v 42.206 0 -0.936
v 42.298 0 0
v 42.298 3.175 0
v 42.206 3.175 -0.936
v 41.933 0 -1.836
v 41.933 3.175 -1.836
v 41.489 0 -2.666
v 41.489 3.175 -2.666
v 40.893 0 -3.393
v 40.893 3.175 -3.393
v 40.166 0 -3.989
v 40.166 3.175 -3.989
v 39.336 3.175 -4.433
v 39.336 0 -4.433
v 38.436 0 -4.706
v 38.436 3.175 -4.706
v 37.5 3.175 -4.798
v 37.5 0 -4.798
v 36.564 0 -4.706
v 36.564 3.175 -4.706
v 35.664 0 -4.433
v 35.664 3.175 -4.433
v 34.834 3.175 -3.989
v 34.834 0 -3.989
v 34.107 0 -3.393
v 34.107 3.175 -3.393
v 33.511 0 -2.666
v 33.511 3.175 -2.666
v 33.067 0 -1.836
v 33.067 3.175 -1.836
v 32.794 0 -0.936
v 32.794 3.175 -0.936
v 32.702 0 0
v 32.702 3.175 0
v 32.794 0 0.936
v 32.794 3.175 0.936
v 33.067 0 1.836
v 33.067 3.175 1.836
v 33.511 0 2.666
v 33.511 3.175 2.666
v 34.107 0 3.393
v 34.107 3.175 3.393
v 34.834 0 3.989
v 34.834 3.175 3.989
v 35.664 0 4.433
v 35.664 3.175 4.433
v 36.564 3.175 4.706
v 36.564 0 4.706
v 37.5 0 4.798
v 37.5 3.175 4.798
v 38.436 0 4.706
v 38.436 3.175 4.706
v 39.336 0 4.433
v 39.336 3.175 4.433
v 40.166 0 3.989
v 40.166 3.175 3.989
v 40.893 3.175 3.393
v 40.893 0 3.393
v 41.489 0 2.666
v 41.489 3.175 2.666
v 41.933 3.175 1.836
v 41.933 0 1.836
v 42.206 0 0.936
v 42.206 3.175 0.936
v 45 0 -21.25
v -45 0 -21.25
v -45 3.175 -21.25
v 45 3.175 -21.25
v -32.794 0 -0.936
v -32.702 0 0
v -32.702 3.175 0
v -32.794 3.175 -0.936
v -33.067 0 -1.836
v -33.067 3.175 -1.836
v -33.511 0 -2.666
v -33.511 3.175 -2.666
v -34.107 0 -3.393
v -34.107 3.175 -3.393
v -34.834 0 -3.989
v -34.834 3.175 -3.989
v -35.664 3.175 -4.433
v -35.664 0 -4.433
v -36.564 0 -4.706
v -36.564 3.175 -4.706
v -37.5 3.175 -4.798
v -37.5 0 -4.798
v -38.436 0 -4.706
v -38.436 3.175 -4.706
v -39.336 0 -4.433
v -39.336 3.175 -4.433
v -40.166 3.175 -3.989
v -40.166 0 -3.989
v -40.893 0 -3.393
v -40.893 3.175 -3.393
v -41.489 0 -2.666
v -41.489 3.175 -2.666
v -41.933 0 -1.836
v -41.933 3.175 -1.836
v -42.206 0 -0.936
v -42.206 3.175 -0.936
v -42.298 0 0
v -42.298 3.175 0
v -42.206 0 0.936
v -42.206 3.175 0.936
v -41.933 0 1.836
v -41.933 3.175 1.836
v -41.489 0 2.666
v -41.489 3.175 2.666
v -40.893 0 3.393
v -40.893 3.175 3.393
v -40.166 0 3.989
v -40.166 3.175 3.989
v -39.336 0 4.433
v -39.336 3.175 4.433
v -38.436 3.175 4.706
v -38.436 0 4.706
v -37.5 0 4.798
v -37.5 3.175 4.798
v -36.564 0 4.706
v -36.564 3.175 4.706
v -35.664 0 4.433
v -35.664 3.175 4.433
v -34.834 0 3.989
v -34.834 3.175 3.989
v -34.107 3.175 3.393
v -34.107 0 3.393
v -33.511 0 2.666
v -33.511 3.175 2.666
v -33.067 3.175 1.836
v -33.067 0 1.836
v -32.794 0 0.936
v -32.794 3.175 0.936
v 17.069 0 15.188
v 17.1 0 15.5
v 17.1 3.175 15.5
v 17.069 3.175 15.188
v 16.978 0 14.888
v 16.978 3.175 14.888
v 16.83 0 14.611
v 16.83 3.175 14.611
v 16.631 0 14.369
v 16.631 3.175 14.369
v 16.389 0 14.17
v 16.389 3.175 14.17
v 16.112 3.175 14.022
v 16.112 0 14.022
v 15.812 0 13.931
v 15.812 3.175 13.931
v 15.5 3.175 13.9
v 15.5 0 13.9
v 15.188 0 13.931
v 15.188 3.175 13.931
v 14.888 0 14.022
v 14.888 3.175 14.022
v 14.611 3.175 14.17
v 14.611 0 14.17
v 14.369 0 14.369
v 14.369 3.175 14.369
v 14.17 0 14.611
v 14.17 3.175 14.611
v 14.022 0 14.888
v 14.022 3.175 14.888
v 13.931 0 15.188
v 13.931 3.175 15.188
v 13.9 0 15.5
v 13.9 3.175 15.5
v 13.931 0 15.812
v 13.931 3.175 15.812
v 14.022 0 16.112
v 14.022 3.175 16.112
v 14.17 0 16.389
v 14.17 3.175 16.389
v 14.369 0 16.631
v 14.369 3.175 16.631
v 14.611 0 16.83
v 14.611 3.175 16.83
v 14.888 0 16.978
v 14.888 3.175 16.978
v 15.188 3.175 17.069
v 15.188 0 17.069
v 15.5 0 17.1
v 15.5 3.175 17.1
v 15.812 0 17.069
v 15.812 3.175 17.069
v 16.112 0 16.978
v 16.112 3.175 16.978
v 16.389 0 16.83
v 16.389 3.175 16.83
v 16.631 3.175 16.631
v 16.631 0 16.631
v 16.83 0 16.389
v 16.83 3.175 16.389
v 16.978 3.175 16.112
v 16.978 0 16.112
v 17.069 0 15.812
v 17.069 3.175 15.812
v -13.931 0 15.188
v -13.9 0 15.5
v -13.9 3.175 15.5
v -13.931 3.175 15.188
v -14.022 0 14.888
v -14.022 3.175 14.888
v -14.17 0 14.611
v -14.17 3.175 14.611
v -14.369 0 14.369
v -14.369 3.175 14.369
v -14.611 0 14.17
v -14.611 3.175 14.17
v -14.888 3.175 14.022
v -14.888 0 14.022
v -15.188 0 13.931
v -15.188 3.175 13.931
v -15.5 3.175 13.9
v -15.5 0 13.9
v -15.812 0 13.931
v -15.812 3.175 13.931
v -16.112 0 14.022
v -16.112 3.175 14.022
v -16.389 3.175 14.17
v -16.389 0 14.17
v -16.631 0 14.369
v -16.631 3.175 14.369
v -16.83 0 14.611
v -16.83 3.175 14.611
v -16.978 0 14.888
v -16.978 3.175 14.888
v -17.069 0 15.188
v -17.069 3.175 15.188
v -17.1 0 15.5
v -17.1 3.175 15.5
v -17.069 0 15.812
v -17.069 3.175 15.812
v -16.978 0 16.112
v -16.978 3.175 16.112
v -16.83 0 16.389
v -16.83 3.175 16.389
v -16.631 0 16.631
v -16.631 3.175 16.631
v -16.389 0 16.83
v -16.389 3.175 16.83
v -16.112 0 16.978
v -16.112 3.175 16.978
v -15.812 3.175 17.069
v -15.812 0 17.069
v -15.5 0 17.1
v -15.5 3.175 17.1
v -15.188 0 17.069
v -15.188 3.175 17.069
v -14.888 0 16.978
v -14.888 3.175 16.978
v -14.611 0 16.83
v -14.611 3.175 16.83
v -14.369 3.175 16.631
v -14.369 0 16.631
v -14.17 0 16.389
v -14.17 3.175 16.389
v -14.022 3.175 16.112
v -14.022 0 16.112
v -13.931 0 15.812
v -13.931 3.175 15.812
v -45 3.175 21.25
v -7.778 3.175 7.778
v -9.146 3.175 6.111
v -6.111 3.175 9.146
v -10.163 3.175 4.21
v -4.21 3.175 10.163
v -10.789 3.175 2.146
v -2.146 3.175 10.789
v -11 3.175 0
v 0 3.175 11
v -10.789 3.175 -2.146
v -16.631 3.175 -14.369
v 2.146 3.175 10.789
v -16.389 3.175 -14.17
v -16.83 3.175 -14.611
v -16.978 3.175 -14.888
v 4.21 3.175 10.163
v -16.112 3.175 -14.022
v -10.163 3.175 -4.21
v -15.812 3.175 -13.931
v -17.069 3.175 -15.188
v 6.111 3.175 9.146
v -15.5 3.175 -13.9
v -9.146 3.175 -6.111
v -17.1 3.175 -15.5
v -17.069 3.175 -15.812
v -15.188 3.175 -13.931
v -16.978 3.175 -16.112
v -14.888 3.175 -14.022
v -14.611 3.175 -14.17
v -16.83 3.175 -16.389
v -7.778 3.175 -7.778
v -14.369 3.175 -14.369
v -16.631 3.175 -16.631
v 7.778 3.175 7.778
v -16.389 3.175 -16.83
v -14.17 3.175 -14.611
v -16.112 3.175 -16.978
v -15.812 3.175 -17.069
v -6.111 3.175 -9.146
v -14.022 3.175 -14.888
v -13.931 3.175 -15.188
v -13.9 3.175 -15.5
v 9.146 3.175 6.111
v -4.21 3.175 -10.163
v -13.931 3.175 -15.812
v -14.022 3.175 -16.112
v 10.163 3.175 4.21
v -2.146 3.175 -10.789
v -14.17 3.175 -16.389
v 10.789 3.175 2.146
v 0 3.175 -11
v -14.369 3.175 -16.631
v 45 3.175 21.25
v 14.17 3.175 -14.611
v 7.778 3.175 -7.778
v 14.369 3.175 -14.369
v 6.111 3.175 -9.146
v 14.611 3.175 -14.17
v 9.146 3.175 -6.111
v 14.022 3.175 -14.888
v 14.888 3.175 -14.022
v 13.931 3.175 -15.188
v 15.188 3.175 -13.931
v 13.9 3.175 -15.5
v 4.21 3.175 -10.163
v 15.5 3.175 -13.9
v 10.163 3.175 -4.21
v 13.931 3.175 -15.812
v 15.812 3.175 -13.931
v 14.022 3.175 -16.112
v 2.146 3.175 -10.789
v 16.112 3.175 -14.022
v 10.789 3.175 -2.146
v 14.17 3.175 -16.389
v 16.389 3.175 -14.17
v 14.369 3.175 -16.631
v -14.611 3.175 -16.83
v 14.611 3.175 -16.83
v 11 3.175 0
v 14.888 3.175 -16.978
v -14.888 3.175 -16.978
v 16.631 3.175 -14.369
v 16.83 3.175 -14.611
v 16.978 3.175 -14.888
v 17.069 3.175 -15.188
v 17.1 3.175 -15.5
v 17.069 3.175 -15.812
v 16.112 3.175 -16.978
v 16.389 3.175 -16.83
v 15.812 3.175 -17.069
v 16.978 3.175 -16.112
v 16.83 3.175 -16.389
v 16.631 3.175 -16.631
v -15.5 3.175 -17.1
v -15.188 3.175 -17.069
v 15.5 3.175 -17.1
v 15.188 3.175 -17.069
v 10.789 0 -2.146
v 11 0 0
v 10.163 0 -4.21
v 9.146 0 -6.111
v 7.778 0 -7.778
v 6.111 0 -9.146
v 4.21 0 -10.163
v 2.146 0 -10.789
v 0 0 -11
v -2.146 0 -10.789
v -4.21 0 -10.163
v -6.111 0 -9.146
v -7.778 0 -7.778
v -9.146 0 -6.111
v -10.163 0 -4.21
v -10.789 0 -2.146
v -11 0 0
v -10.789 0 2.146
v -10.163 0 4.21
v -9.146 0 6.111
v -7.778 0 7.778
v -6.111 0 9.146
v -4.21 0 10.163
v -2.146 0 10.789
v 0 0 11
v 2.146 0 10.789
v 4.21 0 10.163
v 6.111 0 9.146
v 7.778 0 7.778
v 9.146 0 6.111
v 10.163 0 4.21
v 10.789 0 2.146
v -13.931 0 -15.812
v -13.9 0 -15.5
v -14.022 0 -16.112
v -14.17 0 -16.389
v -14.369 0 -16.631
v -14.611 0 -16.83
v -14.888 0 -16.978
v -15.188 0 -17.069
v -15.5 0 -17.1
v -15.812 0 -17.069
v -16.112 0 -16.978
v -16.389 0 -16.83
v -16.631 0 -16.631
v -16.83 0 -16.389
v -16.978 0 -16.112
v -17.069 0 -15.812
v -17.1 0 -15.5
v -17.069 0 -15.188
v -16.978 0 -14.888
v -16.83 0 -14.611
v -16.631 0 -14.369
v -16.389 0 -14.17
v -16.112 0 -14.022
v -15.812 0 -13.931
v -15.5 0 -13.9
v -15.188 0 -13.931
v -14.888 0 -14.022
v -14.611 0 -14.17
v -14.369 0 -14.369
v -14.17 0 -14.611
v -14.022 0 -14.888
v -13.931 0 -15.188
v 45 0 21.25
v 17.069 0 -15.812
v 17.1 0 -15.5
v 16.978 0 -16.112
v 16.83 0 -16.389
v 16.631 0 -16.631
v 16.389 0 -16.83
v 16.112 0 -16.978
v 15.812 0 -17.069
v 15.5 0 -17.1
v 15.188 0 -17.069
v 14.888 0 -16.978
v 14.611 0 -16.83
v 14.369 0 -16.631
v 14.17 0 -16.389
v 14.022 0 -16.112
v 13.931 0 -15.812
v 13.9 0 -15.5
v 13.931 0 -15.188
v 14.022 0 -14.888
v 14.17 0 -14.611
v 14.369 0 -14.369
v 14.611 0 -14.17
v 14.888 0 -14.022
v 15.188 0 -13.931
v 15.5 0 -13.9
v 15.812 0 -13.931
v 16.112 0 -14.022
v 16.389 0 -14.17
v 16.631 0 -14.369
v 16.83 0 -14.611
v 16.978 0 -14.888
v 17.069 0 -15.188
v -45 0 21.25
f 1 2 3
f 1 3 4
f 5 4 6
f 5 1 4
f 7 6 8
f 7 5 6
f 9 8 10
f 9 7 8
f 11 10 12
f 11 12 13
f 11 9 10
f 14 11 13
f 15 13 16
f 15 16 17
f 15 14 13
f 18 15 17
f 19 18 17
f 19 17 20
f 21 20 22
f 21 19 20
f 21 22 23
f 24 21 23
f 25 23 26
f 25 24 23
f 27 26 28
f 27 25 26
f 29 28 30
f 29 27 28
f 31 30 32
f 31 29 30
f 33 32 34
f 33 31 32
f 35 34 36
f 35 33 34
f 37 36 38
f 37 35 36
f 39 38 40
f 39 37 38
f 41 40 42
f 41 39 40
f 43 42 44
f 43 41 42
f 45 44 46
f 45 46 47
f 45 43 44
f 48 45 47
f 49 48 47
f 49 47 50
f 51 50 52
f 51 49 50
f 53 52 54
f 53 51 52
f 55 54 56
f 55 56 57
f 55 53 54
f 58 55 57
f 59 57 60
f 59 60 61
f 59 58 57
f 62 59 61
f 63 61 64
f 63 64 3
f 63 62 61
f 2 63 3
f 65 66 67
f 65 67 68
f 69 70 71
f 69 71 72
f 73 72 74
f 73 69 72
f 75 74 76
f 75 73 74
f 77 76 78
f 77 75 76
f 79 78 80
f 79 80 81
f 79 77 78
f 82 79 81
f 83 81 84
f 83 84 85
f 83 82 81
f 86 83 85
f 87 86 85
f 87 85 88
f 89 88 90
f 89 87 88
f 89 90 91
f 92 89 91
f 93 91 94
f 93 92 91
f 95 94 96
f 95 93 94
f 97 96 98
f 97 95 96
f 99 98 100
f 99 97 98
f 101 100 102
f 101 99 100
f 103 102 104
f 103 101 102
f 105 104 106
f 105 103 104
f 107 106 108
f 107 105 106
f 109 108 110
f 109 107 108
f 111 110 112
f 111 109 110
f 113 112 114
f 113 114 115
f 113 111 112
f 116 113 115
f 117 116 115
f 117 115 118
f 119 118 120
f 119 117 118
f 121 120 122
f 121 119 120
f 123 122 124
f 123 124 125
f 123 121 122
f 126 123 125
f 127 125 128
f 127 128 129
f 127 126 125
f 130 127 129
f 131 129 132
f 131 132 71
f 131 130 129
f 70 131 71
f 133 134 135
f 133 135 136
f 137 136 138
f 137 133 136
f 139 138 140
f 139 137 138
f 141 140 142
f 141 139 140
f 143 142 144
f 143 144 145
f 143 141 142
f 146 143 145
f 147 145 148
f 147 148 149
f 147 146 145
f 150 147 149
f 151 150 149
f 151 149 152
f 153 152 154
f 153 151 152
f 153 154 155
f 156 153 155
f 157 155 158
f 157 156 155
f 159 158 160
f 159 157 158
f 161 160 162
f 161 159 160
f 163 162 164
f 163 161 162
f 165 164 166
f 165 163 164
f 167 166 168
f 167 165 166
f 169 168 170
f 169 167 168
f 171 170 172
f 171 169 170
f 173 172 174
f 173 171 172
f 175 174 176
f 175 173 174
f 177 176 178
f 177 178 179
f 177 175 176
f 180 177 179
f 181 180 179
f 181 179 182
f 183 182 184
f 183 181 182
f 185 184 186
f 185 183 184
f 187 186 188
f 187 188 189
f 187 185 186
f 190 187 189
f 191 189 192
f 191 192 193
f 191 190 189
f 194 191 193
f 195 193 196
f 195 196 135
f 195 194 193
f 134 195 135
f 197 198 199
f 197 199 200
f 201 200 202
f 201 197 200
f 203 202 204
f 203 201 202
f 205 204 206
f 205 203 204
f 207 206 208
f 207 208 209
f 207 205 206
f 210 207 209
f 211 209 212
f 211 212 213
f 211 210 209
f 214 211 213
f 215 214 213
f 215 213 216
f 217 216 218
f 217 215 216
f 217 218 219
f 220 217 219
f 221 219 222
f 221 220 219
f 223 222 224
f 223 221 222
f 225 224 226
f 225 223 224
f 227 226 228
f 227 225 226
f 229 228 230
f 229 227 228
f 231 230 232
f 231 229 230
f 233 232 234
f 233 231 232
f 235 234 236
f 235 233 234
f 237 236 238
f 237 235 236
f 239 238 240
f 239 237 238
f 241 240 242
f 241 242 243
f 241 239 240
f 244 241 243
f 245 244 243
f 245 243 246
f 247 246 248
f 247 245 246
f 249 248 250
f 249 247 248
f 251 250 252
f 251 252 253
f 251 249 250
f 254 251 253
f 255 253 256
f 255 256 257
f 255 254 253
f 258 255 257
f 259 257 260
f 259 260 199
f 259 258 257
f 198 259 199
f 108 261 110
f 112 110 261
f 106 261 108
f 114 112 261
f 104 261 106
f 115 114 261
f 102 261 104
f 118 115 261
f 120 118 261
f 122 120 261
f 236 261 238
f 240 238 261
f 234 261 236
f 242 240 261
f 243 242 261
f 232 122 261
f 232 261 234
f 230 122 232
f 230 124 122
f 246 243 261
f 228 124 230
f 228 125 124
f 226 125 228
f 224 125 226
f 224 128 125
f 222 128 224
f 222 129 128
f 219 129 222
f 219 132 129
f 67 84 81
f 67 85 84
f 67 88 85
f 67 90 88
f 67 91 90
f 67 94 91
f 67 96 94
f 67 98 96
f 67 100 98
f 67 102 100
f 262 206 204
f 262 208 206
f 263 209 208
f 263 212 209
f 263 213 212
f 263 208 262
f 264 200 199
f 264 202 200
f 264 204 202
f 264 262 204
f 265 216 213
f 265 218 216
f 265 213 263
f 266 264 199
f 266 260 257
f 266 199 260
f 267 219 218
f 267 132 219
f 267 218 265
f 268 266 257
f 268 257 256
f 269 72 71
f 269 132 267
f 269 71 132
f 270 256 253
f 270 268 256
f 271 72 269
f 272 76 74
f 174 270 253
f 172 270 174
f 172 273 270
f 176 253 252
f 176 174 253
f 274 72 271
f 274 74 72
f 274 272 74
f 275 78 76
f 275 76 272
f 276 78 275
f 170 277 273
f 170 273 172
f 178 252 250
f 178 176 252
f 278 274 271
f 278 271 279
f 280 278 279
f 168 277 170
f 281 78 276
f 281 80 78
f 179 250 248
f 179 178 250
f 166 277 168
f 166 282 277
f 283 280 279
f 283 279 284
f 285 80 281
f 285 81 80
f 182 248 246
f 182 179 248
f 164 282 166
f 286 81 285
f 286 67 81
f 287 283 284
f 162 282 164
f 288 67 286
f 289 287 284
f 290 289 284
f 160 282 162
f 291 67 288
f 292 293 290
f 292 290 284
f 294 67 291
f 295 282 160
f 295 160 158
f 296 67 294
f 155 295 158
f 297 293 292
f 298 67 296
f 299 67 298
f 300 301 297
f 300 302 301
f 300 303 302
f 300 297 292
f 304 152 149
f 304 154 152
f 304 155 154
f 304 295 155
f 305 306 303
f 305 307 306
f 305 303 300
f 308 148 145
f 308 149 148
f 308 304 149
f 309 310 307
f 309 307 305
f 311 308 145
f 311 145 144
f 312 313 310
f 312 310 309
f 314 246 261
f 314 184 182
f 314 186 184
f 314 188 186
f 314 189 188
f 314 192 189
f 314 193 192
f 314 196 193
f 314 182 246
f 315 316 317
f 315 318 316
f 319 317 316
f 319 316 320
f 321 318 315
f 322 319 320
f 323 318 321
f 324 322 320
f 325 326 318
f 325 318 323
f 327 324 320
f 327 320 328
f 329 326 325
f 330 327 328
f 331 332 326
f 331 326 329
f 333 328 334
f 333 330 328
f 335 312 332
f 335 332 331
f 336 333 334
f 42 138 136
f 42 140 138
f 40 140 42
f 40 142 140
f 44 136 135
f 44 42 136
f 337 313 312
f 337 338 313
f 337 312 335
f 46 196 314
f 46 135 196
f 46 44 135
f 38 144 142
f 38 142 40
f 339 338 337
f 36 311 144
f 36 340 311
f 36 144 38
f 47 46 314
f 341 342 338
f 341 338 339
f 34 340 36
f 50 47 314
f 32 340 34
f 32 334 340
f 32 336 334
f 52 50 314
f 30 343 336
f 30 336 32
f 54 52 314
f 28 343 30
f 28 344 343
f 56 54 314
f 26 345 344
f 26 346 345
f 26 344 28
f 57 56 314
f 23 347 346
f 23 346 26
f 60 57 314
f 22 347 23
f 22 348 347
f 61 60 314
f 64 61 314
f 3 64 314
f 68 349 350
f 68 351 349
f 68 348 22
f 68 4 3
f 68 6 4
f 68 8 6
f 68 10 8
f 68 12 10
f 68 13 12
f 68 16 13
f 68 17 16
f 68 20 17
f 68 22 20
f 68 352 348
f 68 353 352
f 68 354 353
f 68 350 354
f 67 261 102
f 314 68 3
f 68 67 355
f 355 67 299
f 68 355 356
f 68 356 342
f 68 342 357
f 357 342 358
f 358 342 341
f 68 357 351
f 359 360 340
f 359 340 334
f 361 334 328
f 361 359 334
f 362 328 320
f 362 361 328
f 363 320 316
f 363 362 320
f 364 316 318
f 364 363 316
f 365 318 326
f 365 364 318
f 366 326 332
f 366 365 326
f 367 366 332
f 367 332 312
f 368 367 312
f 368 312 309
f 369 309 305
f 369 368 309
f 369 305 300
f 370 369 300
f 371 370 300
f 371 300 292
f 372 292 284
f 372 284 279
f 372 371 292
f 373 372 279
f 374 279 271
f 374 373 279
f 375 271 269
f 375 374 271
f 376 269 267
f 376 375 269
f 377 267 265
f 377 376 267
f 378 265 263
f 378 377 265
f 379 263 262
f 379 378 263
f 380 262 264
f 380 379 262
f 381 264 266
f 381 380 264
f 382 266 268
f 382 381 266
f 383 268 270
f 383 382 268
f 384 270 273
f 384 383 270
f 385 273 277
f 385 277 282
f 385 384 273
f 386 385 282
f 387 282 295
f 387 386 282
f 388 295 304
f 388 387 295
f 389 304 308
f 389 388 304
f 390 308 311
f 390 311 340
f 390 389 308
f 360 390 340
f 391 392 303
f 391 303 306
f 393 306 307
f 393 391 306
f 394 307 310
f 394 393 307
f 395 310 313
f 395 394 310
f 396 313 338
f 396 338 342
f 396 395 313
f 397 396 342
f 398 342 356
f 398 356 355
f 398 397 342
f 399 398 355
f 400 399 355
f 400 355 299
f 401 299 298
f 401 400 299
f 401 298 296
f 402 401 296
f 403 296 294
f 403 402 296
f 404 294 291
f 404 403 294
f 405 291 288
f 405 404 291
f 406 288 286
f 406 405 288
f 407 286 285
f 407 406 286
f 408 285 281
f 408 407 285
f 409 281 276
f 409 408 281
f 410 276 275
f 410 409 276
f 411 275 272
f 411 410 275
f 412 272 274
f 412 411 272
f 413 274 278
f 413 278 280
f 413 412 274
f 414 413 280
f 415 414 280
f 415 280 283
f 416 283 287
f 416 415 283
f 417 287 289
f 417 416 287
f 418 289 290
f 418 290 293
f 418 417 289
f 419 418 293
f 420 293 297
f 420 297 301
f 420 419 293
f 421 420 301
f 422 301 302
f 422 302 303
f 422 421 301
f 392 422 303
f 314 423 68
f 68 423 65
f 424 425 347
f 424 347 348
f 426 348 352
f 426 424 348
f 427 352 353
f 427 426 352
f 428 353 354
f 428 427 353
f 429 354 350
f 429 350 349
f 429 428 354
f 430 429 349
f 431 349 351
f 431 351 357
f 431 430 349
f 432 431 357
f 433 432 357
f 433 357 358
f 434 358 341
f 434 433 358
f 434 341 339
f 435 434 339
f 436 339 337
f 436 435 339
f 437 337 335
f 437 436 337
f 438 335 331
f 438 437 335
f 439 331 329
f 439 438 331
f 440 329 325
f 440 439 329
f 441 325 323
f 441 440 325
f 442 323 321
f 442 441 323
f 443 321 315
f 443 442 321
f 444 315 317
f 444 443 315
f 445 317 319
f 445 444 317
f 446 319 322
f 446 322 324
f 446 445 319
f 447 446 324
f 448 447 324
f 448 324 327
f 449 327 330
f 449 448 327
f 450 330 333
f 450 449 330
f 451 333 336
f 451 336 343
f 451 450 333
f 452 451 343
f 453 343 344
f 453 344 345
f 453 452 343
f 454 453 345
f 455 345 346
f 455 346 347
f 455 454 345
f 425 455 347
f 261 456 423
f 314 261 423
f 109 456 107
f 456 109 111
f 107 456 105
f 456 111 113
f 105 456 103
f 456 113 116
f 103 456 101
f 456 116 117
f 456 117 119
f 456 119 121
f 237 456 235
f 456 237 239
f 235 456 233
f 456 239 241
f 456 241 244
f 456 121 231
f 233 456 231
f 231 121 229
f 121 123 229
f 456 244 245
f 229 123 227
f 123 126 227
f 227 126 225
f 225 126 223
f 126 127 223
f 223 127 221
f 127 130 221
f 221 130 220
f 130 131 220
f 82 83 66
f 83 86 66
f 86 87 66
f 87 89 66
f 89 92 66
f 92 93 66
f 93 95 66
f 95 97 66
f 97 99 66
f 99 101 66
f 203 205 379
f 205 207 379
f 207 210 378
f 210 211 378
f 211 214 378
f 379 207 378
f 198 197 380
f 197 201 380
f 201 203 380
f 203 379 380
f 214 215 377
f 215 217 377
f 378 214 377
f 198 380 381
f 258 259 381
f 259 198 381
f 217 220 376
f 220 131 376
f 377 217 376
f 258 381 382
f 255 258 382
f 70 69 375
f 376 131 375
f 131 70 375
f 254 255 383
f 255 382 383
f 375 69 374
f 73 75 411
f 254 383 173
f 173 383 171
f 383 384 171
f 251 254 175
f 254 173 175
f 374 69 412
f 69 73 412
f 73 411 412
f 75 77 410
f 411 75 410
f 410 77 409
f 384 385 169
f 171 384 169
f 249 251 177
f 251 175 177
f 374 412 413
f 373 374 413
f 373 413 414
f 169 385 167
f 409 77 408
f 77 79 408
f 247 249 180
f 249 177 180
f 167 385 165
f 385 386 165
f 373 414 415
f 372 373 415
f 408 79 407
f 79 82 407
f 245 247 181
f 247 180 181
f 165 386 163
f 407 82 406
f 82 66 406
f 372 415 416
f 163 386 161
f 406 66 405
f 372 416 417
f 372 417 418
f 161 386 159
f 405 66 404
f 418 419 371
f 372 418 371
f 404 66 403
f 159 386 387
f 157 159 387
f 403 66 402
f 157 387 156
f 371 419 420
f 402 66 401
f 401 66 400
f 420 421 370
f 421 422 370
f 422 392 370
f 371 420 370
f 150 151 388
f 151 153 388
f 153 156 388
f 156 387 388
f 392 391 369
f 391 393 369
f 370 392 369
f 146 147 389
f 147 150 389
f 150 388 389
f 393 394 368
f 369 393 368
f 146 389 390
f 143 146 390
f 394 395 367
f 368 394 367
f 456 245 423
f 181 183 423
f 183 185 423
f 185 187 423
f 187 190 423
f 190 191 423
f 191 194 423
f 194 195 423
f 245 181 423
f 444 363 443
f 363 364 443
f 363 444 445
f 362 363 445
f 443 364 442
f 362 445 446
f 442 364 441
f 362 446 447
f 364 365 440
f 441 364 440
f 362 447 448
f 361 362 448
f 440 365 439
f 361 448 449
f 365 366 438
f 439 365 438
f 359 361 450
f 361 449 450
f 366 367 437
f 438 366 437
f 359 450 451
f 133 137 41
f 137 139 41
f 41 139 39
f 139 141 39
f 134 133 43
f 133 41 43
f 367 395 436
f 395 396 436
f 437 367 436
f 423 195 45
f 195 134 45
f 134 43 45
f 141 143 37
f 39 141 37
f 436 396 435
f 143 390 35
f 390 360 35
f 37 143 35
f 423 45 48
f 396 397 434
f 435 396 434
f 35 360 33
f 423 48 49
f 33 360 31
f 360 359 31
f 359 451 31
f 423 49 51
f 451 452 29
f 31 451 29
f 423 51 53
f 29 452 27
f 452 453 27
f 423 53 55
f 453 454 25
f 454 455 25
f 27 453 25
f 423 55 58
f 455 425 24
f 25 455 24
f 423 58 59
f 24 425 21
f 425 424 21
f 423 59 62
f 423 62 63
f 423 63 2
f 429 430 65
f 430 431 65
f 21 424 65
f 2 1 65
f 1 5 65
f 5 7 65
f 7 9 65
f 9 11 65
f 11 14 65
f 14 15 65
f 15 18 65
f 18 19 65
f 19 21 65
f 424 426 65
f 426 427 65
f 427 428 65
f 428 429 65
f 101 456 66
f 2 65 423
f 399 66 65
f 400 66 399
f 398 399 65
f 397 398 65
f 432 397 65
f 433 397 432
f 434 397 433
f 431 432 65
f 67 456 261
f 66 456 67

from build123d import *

# Parameters (mm, degrees)
SKETCH2_W           = 90
SKETCH2_H           = 42.5
SKETCH2_R           = 11
SKETCH2_R_2         = 1.6
SKETCH2_R_3         = 4.79806
BOSS_EXTRUDE1_DEPTH = 3.175


with BuildPart() as part:
    # Sketch2 → Boss-Extrude1 (new body)
    with BuildSketch(Plane(origin=(0, 0, 0), x_dir=(1, 0, 0), z_dir=(0, 1, 0))):
        Rectangle(SKETCH2_W, SKETCH2_H)
        Circle(SKETCH2_R, mode=Mode.SUBTRACT)
        with Locations((-15.5, 15.5)):
            Circle(SKETCH2_R_2, mode=Mode.SUBTRACT)
        with Locations((15.5, 15.5)):
            Circle(SKETCH2_R_2, mode=Mode.SUBTRACT)
        with Locations((15.5, -15.5)):
            Circle(SKETCH2_R_2, mode=Mode.SUBTRACT)
        with Locations((-15.5, -15.5)):
            Circle(SKETCH2_R_2, mode=Mode.SUBTRACT)
        with Locations((-37.5, 0)):
            Circle(SKETCH2_R_3, mode=Mode.SUBTRACT)
        with Locations((37.5, 0)):
            Circle(SKETCH2_R_3, mode=Mode.SUBTRACT)
    extrude(amount=BOSS_EXTRUDE1_DEPTH)


solid = part.part
